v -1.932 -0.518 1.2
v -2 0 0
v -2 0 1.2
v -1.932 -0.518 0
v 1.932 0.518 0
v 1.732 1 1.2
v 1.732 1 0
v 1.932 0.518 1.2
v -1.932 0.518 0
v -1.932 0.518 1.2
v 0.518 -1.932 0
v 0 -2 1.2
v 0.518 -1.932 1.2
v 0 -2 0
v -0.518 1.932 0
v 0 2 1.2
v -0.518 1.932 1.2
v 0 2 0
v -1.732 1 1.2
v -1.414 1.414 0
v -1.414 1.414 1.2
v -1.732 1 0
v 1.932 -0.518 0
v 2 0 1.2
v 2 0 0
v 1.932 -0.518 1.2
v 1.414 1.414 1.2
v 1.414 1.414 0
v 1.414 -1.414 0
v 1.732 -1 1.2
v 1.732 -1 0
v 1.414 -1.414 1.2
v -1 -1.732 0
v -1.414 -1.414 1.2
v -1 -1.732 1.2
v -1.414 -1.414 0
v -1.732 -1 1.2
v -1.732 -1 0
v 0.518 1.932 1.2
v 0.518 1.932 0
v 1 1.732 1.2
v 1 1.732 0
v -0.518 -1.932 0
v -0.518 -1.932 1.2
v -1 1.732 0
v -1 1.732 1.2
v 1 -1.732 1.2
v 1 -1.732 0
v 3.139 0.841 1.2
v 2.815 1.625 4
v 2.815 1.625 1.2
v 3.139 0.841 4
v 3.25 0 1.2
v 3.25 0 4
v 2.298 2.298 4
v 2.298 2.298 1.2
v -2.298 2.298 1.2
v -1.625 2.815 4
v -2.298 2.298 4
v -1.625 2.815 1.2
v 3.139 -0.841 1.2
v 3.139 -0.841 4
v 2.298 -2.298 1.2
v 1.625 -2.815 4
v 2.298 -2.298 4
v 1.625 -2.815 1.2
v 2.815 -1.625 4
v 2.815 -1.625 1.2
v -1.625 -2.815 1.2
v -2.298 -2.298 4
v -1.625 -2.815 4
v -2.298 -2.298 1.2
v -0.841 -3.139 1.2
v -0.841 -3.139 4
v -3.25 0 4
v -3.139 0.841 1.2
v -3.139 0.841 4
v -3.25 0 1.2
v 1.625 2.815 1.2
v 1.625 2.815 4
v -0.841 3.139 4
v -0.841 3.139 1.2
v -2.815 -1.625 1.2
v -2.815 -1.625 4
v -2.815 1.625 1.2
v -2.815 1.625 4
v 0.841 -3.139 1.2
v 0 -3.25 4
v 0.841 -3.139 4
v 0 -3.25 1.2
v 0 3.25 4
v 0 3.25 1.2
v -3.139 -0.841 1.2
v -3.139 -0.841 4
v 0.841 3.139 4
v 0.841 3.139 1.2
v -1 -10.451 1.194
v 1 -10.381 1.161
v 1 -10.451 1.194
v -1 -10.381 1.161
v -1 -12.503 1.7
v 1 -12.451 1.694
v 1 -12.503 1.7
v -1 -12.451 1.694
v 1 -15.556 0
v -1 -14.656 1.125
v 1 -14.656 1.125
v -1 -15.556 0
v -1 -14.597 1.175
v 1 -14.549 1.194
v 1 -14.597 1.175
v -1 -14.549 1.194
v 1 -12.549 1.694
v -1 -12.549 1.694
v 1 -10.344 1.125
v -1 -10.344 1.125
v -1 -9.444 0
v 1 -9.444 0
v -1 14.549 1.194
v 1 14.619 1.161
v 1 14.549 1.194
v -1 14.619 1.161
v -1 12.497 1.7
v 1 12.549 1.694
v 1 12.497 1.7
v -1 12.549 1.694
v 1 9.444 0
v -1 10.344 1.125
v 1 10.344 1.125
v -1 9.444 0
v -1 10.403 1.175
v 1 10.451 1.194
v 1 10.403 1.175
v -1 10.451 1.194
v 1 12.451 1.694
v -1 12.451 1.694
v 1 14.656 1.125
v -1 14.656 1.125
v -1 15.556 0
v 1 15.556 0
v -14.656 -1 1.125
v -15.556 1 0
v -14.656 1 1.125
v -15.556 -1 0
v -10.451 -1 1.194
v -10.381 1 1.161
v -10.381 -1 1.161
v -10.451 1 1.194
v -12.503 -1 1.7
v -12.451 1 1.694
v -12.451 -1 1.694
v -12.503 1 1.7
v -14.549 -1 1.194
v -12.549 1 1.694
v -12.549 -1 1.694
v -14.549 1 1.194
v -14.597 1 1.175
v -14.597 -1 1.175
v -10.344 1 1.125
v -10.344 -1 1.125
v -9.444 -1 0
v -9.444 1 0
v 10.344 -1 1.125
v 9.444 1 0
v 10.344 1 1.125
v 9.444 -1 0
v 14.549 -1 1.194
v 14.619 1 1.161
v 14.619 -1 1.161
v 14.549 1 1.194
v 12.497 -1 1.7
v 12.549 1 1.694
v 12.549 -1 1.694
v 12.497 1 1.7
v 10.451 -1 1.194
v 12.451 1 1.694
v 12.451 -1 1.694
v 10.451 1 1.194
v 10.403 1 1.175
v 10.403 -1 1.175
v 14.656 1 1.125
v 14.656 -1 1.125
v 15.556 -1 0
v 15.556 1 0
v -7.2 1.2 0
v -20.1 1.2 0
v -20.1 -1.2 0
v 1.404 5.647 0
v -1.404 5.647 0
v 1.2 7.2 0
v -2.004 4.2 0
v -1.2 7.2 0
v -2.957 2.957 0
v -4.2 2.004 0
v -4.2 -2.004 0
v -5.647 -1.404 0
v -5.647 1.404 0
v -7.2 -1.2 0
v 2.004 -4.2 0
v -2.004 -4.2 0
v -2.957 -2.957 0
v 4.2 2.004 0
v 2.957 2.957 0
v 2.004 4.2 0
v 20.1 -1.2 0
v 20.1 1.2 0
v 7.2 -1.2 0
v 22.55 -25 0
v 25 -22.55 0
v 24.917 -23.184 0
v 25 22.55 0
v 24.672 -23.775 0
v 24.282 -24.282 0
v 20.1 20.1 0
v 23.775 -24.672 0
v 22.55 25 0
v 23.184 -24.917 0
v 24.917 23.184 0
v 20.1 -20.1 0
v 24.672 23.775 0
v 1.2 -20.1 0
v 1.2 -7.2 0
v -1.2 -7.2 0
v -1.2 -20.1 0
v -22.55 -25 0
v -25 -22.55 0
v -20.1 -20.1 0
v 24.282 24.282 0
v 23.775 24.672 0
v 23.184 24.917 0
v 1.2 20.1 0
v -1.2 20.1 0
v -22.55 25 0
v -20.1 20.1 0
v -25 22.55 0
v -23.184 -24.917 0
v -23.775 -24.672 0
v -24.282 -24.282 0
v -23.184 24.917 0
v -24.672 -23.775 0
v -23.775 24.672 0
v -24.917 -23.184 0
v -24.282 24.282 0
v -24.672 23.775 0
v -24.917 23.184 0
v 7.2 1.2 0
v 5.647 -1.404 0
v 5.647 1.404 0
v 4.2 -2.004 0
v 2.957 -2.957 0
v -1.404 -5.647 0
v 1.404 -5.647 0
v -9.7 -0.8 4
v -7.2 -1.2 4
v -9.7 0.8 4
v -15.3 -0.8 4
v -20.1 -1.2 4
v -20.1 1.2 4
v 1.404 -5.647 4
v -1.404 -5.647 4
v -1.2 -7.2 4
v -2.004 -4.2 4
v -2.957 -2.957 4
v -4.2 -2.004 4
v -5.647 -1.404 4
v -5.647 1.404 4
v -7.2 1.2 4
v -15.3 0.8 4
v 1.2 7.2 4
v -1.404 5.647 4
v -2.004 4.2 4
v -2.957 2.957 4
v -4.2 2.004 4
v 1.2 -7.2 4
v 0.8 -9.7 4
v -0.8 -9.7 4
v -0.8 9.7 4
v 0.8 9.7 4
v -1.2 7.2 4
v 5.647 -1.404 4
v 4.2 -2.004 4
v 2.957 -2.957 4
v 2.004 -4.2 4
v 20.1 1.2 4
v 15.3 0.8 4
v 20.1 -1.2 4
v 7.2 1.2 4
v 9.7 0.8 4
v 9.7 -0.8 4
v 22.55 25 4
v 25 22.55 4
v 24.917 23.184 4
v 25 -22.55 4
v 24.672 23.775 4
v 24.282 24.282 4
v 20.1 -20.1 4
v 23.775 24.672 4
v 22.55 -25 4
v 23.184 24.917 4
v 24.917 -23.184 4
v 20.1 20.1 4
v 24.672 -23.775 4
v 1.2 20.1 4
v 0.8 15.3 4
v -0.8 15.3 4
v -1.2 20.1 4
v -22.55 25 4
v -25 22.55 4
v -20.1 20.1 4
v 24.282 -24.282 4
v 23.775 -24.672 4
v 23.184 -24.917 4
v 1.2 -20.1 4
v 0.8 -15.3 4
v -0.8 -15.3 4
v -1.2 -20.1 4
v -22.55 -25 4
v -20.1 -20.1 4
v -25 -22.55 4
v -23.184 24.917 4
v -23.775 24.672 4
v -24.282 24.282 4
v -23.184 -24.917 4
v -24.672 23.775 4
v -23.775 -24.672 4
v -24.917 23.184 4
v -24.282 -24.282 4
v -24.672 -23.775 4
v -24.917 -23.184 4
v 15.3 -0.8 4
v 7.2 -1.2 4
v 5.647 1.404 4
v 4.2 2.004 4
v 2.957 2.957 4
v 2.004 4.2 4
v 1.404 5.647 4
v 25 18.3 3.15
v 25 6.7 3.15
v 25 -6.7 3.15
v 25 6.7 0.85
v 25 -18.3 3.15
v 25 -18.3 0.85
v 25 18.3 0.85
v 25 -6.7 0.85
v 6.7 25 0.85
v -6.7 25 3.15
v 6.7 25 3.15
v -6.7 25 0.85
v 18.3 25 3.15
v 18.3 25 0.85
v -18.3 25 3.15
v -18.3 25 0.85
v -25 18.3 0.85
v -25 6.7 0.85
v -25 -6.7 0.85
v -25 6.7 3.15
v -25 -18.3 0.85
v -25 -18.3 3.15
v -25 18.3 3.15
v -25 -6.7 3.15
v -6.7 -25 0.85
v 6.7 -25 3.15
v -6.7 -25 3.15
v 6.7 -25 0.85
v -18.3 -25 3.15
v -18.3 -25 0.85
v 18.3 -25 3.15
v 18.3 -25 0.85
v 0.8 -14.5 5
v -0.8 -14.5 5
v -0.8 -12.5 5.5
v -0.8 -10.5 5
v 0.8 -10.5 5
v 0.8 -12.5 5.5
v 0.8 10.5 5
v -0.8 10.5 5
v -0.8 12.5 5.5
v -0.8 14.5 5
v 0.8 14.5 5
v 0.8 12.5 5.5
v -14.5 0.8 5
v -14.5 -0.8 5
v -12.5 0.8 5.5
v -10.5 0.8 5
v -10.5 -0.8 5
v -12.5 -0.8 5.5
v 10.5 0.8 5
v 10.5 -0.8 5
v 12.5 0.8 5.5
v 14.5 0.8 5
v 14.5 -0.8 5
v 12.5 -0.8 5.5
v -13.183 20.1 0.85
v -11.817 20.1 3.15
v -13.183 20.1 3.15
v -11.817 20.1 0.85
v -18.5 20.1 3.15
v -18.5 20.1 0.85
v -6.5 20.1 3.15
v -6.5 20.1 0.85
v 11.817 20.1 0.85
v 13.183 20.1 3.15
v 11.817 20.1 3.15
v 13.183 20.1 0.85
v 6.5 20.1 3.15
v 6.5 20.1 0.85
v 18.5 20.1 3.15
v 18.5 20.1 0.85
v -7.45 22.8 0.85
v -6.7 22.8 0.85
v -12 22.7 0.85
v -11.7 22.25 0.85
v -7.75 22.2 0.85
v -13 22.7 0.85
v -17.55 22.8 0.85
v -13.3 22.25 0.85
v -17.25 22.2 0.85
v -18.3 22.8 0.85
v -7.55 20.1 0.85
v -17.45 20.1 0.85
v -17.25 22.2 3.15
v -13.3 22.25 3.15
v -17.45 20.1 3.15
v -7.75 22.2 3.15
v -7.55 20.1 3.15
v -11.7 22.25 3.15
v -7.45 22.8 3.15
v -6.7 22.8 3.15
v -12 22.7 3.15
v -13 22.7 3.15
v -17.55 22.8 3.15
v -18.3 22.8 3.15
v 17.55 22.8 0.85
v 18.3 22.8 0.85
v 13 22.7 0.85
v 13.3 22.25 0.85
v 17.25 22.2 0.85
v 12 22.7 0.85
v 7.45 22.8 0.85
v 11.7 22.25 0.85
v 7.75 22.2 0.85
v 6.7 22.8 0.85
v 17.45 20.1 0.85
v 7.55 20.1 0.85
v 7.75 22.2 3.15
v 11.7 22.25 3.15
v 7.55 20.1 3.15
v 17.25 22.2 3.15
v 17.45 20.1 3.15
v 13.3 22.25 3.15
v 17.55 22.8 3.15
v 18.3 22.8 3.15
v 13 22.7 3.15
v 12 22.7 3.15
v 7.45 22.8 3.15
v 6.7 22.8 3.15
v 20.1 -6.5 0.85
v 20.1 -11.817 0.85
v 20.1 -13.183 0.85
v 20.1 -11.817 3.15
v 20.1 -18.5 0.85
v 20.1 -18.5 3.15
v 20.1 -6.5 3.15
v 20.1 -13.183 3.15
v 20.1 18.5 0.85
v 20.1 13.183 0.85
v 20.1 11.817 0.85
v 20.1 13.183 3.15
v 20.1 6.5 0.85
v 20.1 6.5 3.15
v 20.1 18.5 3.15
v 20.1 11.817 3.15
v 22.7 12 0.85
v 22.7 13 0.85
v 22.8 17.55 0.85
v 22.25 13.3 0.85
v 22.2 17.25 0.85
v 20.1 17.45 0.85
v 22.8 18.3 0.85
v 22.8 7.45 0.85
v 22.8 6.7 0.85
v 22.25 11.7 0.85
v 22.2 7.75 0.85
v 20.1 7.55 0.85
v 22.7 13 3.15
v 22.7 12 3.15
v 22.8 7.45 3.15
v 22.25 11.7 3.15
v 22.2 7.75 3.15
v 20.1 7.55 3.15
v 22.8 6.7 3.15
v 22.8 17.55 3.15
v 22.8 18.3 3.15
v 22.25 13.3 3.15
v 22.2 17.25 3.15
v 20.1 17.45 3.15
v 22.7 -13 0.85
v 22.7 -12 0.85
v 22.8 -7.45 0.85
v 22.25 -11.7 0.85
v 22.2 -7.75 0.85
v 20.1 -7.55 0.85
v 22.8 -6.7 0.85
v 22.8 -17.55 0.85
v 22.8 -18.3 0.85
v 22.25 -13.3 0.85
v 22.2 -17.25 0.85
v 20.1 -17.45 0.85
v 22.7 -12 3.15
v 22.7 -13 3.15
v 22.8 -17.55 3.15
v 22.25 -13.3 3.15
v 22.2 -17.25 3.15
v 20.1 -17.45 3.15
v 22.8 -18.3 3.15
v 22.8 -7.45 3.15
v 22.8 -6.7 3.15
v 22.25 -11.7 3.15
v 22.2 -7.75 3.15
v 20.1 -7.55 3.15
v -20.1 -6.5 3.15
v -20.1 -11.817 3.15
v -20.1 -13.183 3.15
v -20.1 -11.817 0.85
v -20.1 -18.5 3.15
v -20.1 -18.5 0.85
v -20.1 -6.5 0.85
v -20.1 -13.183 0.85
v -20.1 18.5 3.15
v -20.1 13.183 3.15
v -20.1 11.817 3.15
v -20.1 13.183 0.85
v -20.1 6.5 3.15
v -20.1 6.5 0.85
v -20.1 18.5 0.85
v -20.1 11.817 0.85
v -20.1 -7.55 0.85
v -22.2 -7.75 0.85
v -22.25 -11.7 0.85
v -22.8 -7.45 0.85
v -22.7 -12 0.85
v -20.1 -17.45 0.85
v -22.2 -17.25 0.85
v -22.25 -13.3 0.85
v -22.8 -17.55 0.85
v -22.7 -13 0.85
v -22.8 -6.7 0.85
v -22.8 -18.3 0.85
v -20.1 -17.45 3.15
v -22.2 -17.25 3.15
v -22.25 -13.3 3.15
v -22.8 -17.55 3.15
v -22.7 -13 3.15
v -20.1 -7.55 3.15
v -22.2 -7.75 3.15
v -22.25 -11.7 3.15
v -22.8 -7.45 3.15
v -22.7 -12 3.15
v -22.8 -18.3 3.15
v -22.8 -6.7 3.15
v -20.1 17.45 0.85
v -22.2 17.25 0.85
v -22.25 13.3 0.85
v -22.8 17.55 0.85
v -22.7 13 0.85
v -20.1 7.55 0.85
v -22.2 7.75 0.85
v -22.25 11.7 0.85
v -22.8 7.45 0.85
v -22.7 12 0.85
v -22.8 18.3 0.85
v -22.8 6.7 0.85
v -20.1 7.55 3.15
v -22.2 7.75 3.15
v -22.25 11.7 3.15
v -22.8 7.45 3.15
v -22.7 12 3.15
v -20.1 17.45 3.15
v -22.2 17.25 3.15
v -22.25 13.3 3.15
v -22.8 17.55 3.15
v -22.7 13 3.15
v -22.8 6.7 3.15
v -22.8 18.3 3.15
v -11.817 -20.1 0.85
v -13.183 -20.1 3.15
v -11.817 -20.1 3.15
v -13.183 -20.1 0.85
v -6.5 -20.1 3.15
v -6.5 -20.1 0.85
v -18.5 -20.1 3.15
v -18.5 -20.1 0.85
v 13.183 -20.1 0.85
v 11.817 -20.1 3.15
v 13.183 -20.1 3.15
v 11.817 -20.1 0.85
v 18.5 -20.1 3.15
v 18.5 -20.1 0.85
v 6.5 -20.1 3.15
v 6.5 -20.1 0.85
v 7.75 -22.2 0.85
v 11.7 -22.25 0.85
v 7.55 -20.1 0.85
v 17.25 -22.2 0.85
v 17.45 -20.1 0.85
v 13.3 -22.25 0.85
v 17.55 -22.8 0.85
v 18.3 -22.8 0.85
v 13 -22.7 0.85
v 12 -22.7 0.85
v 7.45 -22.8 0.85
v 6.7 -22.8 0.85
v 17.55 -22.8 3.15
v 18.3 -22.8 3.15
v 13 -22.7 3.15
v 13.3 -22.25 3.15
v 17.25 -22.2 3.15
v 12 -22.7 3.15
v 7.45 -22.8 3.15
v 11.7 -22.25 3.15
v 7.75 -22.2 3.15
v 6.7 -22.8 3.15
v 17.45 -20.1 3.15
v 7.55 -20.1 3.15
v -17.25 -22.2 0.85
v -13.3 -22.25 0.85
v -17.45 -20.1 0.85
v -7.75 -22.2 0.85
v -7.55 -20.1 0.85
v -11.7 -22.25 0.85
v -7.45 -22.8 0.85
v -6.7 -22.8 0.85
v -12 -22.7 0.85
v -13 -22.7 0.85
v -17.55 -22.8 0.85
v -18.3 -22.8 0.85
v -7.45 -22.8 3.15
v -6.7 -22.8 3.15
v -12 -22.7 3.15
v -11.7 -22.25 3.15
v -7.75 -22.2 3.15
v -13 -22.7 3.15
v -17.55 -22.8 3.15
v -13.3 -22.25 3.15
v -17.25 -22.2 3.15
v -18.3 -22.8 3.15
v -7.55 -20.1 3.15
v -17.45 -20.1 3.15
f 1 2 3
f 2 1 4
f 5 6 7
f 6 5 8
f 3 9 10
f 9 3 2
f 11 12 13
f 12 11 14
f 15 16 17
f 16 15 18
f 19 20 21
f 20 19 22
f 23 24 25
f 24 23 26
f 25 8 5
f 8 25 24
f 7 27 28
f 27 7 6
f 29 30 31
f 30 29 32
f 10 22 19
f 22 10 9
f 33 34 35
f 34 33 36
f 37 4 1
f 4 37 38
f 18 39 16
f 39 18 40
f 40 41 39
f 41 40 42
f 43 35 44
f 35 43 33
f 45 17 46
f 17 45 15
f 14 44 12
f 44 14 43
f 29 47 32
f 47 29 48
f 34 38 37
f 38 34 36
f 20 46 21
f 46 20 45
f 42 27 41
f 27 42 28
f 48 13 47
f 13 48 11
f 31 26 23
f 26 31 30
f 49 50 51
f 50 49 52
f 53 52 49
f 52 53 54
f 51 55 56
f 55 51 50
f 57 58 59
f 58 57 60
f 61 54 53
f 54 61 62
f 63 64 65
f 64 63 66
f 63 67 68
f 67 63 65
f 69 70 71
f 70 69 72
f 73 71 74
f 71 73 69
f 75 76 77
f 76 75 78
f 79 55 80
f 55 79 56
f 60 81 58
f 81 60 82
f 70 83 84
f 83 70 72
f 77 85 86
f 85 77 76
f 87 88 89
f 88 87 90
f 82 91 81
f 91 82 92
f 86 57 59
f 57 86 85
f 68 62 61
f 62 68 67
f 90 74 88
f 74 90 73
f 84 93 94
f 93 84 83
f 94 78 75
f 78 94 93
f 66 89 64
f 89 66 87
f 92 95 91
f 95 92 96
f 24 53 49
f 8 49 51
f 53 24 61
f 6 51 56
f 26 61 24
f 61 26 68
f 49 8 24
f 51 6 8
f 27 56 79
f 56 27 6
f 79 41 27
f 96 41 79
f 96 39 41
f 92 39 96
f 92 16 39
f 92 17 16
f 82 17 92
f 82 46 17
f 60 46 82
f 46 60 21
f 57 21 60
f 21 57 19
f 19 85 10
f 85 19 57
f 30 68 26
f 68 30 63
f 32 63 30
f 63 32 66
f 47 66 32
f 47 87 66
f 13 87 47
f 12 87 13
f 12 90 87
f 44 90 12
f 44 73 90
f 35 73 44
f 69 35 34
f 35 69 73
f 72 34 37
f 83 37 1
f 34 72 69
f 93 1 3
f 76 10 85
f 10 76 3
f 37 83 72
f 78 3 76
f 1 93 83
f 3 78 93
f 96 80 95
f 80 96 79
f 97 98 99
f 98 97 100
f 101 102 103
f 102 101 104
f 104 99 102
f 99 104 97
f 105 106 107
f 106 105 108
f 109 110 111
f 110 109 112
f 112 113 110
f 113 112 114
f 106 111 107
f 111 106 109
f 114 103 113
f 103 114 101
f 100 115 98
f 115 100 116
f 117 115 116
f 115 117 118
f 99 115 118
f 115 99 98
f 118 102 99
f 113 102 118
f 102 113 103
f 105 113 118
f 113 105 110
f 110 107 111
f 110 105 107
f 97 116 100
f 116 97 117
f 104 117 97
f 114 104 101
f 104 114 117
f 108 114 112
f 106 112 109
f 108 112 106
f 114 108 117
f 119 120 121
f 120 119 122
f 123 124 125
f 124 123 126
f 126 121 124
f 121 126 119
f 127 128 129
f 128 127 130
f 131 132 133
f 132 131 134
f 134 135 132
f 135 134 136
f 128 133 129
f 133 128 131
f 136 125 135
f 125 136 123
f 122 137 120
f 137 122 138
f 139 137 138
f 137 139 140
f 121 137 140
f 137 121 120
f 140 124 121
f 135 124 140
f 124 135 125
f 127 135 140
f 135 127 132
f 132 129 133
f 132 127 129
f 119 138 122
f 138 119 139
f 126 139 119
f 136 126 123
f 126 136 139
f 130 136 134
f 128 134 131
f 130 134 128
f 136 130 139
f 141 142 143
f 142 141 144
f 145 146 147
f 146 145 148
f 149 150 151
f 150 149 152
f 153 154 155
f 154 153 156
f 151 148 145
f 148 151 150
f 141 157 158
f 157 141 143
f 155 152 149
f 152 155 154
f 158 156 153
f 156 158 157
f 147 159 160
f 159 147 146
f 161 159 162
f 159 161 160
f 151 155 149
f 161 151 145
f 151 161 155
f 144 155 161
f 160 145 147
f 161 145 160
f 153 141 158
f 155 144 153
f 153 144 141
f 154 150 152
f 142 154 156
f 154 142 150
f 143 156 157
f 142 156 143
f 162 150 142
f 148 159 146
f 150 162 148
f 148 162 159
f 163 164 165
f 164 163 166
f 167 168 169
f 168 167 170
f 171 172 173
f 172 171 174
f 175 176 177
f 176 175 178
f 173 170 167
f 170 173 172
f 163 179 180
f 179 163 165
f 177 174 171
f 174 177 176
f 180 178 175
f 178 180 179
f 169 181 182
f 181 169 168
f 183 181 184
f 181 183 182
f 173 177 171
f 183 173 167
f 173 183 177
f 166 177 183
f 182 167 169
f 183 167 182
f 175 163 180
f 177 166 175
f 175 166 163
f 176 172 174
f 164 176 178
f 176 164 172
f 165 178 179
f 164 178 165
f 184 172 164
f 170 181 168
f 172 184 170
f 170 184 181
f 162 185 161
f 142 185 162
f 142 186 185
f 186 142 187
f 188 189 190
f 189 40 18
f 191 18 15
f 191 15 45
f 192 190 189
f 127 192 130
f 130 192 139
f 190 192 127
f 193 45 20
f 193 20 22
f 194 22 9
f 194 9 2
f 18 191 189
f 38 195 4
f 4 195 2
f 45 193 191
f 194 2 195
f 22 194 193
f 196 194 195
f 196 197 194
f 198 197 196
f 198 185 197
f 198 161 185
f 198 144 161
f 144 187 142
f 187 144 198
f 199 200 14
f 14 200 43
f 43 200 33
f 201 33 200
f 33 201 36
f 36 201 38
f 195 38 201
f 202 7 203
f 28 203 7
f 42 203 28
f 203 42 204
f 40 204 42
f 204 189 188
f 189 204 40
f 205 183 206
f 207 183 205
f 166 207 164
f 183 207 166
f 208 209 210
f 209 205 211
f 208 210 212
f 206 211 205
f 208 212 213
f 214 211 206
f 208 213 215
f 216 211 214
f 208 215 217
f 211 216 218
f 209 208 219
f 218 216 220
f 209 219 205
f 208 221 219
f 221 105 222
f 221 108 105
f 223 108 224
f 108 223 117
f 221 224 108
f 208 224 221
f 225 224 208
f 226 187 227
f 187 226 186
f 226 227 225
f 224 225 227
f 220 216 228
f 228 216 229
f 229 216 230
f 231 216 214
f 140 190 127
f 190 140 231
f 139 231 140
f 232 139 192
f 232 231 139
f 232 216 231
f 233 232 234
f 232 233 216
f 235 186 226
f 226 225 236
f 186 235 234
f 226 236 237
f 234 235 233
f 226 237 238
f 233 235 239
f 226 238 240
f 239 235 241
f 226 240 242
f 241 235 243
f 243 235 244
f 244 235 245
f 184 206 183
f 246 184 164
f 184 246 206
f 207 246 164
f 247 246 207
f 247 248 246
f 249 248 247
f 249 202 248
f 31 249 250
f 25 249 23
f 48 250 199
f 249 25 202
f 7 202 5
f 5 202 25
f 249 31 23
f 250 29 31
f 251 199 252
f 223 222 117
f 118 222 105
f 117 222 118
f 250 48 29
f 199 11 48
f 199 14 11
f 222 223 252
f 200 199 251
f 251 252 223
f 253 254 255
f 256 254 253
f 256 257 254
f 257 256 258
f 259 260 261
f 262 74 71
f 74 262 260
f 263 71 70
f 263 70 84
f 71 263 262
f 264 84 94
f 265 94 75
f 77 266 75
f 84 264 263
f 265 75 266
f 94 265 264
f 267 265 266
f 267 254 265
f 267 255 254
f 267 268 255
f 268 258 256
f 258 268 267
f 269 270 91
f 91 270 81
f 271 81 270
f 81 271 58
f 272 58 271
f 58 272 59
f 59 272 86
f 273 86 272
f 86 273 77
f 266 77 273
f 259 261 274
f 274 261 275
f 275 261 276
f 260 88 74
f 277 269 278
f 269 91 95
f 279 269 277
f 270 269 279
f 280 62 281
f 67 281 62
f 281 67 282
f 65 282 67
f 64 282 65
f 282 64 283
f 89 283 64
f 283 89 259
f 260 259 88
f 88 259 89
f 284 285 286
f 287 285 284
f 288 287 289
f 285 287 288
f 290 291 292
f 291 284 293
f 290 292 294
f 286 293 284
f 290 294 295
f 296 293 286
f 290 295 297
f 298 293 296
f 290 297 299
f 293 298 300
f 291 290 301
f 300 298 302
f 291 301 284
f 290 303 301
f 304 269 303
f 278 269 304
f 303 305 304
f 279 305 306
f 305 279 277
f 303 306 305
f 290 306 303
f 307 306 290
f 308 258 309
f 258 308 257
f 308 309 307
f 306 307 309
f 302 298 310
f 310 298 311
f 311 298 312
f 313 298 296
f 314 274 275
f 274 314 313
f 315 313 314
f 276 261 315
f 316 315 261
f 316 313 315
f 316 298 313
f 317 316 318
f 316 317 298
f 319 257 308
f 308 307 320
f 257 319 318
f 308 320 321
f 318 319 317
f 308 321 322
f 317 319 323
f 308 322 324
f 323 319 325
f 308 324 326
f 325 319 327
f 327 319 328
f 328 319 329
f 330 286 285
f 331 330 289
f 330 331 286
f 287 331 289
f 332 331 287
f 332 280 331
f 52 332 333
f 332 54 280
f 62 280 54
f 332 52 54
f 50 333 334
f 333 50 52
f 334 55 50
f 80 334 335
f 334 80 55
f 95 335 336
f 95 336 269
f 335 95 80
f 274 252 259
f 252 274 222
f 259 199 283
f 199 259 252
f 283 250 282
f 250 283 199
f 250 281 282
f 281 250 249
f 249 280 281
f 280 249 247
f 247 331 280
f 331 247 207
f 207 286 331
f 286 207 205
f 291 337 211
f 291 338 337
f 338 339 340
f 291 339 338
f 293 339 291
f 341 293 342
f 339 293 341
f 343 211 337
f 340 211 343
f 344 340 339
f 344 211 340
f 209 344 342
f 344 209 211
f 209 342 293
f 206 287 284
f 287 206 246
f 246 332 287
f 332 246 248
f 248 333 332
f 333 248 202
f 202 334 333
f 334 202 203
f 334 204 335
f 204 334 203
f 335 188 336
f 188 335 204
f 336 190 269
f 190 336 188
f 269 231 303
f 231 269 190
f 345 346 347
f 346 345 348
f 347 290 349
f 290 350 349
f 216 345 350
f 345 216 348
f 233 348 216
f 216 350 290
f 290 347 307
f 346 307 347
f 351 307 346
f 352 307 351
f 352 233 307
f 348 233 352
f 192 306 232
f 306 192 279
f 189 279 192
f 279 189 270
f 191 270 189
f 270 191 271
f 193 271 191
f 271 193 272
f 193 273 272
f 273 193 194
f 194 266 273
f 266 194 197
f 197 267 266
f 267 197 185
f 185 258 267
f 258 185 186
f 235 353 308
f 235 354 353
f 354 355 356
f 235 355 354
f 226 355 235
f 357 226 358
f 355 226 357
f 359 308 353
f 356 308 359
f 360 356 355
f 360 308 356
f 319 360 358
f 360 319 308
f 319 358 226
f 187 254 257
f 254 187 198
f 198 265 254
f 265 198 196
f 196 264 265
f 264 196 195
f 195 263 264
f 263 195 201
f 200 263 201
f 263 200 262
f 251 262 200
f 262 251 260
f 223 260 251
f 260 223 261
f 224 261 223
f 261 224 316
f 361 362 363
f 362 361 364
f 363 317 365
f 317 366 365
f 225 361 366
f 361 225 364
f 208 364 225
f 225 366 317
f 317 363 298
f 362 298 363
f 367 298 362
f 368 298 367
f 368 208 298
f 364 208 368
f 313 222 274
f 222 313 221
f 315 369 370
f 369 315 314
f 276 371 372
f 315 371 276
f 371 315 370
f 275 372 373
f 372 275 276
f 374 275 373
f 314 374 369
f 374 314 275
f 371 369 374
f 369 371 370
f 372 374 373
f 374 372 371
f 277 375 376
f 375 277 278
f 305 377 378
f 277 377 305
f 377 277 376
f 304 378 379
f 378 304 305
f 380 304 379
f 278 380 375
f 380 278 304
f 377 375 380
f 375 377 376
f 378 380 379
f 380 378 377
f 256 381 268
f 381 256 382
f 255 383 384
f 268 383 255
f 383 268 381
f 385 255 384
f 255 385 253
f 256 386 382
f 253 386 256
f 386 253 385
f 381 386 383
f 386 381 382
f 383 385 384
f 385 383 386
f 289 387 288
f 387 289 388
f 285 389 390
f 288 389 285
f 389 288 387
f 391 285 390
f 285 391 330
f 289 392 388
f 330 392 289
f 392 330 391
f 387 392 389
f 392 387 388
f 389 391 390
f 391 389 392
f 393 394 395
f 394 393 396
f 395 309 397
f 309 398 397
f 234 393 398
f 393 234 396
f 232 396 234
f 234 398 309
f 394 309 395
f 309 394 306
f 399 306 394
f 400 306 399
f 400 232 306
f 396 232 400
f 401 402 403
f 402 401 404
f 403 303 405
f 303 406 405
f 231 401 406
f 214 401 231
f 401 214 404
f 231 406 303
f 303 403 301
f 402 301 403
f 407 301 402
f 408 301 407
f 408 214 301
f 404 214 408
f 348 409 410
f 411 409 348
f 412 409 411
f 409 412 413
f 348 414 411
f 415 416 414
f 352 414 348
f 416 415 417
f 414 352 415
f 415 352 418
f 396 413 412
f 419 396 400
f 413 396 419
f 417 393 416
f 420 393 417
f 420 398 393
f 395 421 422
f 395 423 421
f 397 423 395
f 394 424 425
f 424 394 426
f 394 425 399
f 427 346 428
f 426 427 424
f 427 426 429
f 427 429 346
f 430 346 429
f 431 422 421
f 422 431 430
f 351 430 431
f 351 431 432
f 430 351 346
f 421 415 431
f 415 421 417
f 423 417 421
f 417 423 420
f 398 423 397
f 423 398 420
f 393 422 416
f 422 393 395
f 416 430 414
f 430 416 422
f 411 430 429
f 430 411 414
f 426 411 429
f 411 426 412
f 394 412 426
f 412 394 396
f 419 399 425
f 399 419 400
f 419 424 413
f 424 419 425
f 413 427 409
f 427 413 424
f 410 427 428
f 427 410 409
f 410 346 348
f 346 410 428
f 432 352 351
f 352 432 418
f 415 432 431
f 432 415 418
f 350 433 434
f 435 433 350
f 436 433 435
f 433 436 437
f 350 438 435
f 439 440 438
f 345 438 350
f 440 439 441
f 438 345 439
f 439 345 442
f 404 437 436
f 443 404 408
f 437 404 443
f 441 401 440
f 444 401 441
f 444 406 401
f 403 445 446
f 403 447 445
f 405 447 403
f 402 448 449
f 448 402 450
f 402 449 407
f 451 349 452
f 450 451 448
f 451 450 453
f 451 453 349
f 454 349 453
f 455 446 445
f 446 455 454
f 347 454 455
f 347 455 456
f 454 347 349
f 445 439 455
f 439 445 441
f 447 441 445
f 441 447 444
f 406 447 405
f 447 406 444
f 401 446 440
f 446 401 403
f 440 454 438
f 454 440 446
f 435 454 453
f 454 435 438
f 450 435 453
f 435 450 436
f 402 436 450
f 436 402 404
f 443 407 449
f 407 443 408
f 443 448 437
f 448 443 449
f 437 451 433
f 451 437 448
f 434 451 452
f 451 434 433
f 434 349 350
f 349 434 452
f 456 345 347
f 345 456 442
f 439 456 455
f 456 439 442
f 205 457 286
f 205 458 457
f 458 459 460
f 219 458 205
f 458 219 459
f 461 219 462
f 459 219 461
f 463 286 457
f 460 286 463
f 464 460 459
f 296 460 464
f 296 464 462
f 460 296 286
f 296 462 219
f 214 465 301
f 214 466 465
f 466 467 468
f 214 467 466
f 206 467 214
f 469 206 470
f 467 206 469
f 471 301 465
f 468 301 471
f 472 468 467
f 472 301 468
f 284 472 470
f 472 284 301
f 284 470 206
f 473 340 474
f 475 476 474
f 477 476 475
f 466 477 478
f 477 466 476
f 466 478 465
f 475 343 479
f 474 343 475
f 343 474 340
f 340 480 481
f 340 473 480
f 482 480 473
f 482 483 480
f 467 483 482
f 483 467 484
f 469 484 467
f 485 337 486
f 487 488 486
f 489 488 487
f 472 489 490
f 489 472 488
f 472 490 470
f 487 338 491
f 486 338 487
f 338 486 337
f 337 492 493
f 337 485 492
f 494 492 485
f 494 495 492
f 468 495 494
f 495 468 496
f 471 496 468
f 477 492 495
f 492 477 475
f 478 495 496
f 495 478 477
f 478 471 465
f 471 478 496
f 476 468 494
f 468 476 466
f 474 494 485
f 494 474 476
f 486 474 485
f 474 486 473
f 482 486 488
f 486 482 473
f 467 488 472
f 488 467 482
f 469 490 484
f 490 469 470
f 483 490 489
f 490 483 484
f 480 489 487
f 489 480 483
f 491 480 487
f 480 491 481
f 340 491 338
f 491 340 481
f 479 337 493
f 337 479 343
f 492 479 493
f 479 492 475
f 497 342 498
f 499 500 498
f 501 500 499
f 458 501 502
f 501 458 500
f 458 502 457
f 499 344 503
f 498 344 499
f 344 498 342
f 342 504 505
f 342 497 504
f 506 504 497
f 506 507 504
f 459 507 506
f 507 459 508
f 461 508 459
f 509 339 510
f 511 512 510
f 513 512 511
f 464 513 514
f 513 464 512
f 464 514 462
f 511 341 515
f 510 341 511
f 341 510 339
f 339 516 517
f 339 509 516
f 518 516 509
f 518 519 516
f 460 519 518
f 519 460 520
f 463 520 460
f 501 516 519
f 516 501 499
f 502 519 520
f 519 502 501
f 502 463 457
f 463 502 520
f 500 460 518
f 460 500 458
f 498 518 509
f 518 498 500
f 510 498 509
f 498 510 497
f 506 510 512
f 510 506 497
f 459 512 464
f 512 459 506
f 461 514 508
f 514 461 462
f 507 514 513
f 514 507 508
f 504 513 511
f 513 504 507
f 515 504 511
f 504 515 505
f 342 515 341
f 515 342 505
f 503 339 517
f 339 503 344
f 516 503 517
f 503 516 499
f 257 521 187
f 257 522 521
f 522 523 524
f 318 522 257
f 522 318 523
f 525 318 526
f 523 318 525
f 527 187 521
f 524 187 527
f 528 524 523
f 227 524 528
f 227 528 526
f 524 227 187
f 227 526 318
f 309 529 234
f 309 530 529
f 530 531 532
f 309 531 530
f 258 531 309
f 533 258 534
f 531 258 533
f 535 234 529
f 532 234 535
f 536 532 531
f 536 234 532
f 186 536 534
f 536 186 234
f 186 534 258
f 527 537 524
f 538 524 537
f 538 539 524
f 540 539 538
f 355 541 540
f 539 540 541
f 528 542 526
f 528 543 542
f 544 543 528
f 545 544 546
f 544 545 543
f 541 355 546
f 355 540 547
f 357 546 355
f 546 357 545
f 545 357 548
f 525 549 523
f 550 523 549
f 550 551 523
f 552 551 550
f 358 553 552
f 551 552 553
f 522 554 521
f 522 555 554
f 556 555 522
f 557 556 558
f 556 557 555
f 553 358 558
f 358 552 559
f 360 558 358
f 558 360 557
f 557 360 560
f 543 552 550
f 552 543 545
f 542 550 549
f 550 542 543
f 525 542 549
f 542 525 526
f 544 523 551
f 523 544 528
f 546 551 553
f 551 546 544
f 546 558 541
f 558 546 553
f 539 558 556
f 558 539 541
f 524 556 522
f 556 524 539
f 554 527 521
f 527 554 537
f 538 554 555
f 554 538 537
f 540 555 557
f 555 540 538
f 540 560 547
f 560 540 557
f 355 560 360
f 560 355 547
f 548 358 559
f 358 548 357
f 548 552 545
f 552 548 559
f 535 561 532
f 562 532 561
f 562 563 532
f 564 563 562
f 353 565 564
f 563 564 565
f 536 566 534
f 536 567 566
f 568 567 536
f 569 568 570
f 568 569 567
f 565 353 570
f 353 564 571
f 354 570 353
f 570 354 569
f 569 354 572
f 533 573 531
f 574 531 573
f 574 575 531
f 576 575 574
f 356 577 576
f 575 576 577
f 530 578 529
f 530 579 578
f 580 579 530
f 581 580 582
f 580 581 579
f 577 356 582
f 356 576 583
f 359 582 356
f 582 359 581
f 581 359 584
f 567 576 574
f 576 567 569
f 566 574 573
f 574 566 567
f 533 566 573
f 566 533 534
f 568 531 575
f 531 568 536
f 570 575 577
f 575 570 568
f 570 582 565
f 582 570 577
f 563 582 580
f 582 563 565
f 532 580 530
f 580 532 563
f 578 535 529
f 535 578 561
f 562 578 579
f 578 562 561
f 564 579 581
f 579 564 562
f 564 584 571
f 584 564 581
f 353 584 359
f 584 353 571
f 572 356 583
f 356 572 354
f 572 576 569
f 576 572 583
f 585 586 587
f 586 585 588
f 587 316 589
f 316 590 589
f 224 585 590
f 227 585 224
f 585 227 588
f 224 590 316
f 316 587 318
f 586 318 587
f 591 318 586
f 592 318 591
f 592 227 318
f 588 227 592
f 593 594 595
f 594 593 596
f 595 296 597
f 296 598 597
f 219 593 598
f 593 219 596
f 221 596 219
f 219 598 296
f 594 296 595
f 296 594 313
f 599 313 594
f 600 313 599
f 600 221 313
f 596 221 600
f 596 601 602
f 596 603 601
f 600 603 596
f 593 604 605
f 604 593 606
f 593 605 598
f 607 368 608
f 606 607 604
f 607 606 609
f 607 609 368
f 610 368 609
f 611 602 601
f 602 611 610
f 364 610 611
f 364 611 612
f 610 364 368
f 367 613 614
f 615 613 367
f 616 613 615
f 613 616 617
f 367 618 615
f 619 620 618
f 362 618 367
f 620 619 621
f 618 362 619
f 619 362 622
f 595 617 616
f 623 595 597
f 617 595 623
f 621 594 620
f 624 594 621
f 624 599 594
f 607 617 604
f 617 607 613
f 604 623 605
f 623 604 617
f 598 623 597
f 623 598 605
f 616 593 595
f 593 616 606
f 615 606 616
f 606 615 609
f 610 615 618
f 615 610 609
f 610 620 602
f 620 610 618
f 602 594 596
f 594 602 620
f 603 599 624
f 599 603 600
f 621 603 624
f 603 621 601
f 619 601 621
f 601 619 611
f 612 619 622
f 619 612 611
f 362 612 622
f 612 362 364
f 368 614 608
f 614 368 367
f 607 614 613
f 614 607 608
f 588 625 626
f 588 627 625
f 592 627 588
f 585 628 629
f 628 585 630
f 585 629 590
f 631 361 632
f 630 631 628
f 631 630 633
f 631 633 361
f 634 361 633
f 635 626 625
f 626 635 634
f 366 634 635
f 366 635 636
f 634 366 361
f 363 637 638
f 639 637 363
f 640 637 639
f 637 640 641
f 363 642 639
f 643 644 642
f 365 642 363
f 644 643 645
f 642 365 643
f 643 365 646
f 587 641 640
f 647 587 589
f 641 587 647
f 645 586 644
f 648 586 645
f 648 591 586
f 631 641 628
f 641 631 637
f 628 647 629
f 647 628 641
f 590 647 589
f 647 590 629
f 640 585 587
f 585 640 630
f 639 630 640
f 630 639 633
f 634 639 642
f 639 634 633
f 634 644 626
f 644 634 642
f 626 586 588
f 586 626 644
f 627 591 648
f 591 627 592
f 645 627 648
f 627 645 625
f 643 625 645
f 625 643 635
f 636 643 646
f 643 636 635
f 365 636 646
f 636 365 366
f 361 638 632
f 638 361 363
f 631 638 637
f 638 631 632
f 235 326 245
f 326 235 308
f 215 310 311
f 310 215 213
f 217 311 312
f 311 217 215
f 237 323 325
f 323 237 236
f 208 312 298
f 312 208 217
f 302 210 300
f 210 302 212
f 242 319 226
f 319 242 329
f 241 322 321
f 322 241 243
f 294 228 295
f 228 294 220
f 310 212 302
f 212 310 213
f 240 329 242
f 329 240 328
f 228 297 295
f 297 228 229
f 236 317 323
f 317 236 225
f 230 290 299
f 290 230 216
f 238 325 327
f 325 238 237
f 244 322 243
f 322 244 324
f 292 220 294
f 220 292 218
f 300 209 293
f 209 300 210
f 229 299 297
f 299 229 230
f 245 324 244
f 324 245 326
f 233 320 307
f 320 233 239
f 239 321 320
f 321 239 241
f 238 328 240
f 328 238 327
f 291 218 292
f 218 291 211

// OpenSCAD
// file: girl_lock.scad
// Copyright 2025 Natalie Baker // Apache v2 //

include<girl_common.scad>;

girl_lock();

//color("blue")
//translate([0,0,-1]) 
//girl_slot();

module girl_lock() {
	$fn=12;
	linear_extrude(lock_height, center=true)
	mirror_copy([0,1])
	mirror_copy([1,0])
	_girl_lock_part();
}

module girl_slot() {
	$fn=12;
	linear_extrude(lock_height+0.4, center=true, convexity=4)
	mirror_copy([0,1])
	mirror_copy([1,0])
	_girl_slot_part();
}

module _girl_slot_part() {
	polygon([
		[           0,      0.00],
		[lock_width/2+0.30, 0.00],
		[lock_width/2+0.30, 2.20],
		[lock_width/2-0.45, 2.20],
		[lock_width/2-0.75, 2.80],
		[lock_width/2-0.55, lock_depth],
		[lock_width/2+0.50, lock_depth],
		[lock_width/2+0.50, 8.25],
		[lock_width/2-5.00, 8.25],
		[lock_width/2-4.70, 2.75],
		[lock_width/2-5.00, 2.30],
		[           0,      2.30],
	]);
}

module _girl_lock_part() {
	difference() {
		polygon([
			[           0,      0.00],
			[lock_width/2,      0.00],
			[lock_width/2,      2.00],
			[lock_width/2-0.95, 2.00],
			[lock_width/2-0.60, lock_depth+0.1],
			[lock_width/2,      lock_depth+0.1],
			[lock_width/2-0.30, 6.20],
			[lock_width/2-2.15, 7.65],
			[lock_width/2-2.60, 7.90],
			[lock_width/2-3.00, 8.00],
			[lock_width/2-3.40, 7.90],
			[lock_width/2-3.60, 7.70],
			[lock_width/2-3.70, 7.45],
			[lock_width/2-3.25, 2.00],
			[           0,      2.00],
		]);
		polygon([
			[lock_width/2-2.10, 1.00],
			[lock_width/2-1.60, 5.50],
			[lock_width/2-2.50, 6.50],
			[lock_width/2-2.20, 1.00],
		]);
	}
}

module mirror_copy(m) {
	mirror(m) children();
	children();	
}
// file: girl_common.scad
// Copyright 2025 Natalie Baker // Apache v2 //

base_size  = 32;
wall_width =  9;

magnet_dia    = 6.2;
magnet_height = 2.8;

lock_height   = 1.9;
lock_depth    = 4.9;
lock_width    = 11;

lock_hole_dia = 2.25;

grid_size   = base_size + 2*wall_width;
grid_diag   = sqrt(2*grid_size*grid_size);
grid_height = max(lock_height, magnet_height)+1.2;

frame_size = 2.4;

module repeat(size, x, y, z, center) {
	off = center 
		? [(x-1)*size[0],(y-1)*size[1],(z-1)*size[2]]/2 
		: [0,0,0];

	for(i = [0 : x-1])
	for(j = [0 : y-1])
	for(k = [0 : z-1])
		translate([
			size[0]*i-off[0],
			size[1]*j-off[1],
			size[2]*k-off[2]
		]) children();
}
// main file
// Copyright 2025 Natalie Baker // Apache v2 //

include<girl_common.scad>;
use<girl_lock.scad>;

grid_grid_map([[1]]);

module grid_grid_map(m) {

	for(y = [0:len(m)-1]) {
		for(x = [0:len(m[y])-1]) {
			translate([x*grid_size, y*grid_size])
			if (m[y][x]) {
				
				tile_px = m[y][x+1] == 1;
				tile_nx = m[y][x-1] == 1;
				tile_py = m[y+1][x] == 1;
				tile_ny = m[y-1][x] == 1;
				
				air_px = m[y][x+1] != 1;
				air_nx = m[y][x-1] != 1;
				air_py = m[y+1][x] != 1;
				air_ny = m[y-1][x] != 1;
				
				air_pxpy = m[y+1][x+1] != 1;
				air_pxny = m[y-1][x+1] != 1;
				air_nxpy = m[y+1][x-1] != 1;
				air_nxny = m[y-1][x-1] != 1;
				
				girl_grid_section(air_px, air_py, air_nx, air_ny);
				
				linear_extrude(grid_height)
				union() {
					if (tile_px && air_pxpy) {
						translate([grid_size/2, (grid_size-lock_depth)/2])
						square([lock_depth*2, lock_depth], center=true);
					}
						
					if (tile_px && air_pxny) {
						translate([grid_size/2, -(grid_size-lock_depth)/2])
						square([lock_depth*2, lock_depth], center=true);
					}
					
					// -- //
				
					if (tile_nx && air_nxpy) {
						translate([-grid_size/2, (grid_size-lock_depth)/2])
						square([lock_depth*2, lock_depth], center=true);
						
					}
						
					if (tile_nx && air_nxny) {
						translate([-grid_size/2, -(grid_size-lock_depth)/2])
						square([lock_depth*2, lock_depth], center=true);
					}
					
					// -- //
				
					if (tile_py && air_pxpy) {
						translate([(grid_size-lock_depth)/2, grid_size/2])
						square([lock_depth, lock_depth*2], center=true);
					}
				
					if (tile_py && air_nxpy) {
						translate([-(grid_size-lock_depth)/2, grid_size/2])
						square([lock_depth, lock_depth*2], center=true);
					}
					
					// -- //
					
					if (tile_ny && air_pxny) {
						translate([(grid_size-lock_depth)/2, -grid_size/2])
						square([lock_depth, lock_depth*2], center=true);
					}
						
					if (tile_ny && air_nxny) {
						translate([-(grid_size-lock_depth)/2, -grid_size/2])
						square([lock_depth, lock_depth*2], center=true);
					}
				}
			}
		}
	}
	
}

module girl_grid_section(x_p, y_p, x_n, y_n) {
	$fn=24;
	intersection() {
		union() {
			_girl_grid_single();
			
			if (x_p)
			rotate(270)
			translate([0,grid_size/2])
			_girl_grid_slots();
			
			if (x_n)
			rotate(90)
			translate([0,grid_size/2])
			_girl_grid_slots();
			
			if (y_p)
			translate([0,grid_size/2,0])
			_girl_grid_slots();
			
			if (y_n)
			rotate(180)
			translate([0,grid_size/2,0])
			_girl_grid_slots();
		}
			
		linear_extrude(grid_height+100, convexity=4)
		offset( lock_depth/2)
		offset(-lock_depth/2)
		square([grid_size,grid_size],center=true);
	}
}


module _girl_grid_slots() {

	difference() {
		translate([-grid_size/2,-lock_depth,0])
			cube([grid_size,lock_depth,grid_height]);

		translate([-grid_size/4,0,grid_height/2])
			girl_slot();

		translate([grid_size/4,0,grid_height/2])
			girl_slot();
	}
		
}

module _girl_grid_single() {
	union() {
		render()
		difference() {
			linear_extrude(grid_height)
			intersection() {
				repeat([grid_diag/2,grid_diag/2,1], 2, 2, 1, true)
					_girl_grid_lattice(grid_diag/2, frame_size, 6.0);
				square(grid_size, center=true);
			}
			
			_girl_grid_magnet_hole();
			_girl_grid_key(frame_size/3*2,  0.2);
		}
		
		translate([0,0,grid_height])
		_girl_grid_key(frame_size/3*2);
	}
}

module _girl_grid_magnet_hole(tolerance=0.15) {
	mad_d = magnet_dia+2*tolerance;
	mag_h = magnet_height+2*tolerance;
	
	translate([0,0,-tolerance])
	cylinder(d=4, h=grid_height-magnet_height+2*tolerance);
	
	translate([0,0,grid_height-magnet_height])
	cylinder(d=mad_d, h=mag_h);
}

module _girl_grid_lattice(size, wall, radius) {
	intersection() {
		offset(-radius)
		offset( radius)
		union() {
			difference() {
				square(size*26, center=true);
				square(size-wall, center=true);
			}
		}
		square(size, center=true);
	}
}

module _girl_grid_key(wall, tolerance=0) {
	translate([0,-grid_size/4,0])
	rotate([0,0,90])
	_girl_grid_key_single(wall, tolerance);

	translate([0,grid_size/4,0])
	rotate([0,0,90])
	_girl_grid_key_single(wall, tolerance);

	translate([-grid_size/4,0,0])
	_girl_grid_key_single(wall, tolerance);

	translate([grid_size/4,0,0])
	_girl_grid_key_single(wall, tolerance);
}

module _girl_grid_key_single(wall, tolerance=0) {
	rotate([90,0,0])
	translate([0,0,-wall/2-tolerance])
	linear_extrude(wall+2*tolerance)
	offset(tolerance)
	polygon([
		[ 0.00,-0.25],
		[ 3.00,-0.25],
		[ 2.00, 1.00],
		[ 0.00, 1.50],
		[-2.00, 1.00],
		[-3.00,-0.25]
	]);
}
